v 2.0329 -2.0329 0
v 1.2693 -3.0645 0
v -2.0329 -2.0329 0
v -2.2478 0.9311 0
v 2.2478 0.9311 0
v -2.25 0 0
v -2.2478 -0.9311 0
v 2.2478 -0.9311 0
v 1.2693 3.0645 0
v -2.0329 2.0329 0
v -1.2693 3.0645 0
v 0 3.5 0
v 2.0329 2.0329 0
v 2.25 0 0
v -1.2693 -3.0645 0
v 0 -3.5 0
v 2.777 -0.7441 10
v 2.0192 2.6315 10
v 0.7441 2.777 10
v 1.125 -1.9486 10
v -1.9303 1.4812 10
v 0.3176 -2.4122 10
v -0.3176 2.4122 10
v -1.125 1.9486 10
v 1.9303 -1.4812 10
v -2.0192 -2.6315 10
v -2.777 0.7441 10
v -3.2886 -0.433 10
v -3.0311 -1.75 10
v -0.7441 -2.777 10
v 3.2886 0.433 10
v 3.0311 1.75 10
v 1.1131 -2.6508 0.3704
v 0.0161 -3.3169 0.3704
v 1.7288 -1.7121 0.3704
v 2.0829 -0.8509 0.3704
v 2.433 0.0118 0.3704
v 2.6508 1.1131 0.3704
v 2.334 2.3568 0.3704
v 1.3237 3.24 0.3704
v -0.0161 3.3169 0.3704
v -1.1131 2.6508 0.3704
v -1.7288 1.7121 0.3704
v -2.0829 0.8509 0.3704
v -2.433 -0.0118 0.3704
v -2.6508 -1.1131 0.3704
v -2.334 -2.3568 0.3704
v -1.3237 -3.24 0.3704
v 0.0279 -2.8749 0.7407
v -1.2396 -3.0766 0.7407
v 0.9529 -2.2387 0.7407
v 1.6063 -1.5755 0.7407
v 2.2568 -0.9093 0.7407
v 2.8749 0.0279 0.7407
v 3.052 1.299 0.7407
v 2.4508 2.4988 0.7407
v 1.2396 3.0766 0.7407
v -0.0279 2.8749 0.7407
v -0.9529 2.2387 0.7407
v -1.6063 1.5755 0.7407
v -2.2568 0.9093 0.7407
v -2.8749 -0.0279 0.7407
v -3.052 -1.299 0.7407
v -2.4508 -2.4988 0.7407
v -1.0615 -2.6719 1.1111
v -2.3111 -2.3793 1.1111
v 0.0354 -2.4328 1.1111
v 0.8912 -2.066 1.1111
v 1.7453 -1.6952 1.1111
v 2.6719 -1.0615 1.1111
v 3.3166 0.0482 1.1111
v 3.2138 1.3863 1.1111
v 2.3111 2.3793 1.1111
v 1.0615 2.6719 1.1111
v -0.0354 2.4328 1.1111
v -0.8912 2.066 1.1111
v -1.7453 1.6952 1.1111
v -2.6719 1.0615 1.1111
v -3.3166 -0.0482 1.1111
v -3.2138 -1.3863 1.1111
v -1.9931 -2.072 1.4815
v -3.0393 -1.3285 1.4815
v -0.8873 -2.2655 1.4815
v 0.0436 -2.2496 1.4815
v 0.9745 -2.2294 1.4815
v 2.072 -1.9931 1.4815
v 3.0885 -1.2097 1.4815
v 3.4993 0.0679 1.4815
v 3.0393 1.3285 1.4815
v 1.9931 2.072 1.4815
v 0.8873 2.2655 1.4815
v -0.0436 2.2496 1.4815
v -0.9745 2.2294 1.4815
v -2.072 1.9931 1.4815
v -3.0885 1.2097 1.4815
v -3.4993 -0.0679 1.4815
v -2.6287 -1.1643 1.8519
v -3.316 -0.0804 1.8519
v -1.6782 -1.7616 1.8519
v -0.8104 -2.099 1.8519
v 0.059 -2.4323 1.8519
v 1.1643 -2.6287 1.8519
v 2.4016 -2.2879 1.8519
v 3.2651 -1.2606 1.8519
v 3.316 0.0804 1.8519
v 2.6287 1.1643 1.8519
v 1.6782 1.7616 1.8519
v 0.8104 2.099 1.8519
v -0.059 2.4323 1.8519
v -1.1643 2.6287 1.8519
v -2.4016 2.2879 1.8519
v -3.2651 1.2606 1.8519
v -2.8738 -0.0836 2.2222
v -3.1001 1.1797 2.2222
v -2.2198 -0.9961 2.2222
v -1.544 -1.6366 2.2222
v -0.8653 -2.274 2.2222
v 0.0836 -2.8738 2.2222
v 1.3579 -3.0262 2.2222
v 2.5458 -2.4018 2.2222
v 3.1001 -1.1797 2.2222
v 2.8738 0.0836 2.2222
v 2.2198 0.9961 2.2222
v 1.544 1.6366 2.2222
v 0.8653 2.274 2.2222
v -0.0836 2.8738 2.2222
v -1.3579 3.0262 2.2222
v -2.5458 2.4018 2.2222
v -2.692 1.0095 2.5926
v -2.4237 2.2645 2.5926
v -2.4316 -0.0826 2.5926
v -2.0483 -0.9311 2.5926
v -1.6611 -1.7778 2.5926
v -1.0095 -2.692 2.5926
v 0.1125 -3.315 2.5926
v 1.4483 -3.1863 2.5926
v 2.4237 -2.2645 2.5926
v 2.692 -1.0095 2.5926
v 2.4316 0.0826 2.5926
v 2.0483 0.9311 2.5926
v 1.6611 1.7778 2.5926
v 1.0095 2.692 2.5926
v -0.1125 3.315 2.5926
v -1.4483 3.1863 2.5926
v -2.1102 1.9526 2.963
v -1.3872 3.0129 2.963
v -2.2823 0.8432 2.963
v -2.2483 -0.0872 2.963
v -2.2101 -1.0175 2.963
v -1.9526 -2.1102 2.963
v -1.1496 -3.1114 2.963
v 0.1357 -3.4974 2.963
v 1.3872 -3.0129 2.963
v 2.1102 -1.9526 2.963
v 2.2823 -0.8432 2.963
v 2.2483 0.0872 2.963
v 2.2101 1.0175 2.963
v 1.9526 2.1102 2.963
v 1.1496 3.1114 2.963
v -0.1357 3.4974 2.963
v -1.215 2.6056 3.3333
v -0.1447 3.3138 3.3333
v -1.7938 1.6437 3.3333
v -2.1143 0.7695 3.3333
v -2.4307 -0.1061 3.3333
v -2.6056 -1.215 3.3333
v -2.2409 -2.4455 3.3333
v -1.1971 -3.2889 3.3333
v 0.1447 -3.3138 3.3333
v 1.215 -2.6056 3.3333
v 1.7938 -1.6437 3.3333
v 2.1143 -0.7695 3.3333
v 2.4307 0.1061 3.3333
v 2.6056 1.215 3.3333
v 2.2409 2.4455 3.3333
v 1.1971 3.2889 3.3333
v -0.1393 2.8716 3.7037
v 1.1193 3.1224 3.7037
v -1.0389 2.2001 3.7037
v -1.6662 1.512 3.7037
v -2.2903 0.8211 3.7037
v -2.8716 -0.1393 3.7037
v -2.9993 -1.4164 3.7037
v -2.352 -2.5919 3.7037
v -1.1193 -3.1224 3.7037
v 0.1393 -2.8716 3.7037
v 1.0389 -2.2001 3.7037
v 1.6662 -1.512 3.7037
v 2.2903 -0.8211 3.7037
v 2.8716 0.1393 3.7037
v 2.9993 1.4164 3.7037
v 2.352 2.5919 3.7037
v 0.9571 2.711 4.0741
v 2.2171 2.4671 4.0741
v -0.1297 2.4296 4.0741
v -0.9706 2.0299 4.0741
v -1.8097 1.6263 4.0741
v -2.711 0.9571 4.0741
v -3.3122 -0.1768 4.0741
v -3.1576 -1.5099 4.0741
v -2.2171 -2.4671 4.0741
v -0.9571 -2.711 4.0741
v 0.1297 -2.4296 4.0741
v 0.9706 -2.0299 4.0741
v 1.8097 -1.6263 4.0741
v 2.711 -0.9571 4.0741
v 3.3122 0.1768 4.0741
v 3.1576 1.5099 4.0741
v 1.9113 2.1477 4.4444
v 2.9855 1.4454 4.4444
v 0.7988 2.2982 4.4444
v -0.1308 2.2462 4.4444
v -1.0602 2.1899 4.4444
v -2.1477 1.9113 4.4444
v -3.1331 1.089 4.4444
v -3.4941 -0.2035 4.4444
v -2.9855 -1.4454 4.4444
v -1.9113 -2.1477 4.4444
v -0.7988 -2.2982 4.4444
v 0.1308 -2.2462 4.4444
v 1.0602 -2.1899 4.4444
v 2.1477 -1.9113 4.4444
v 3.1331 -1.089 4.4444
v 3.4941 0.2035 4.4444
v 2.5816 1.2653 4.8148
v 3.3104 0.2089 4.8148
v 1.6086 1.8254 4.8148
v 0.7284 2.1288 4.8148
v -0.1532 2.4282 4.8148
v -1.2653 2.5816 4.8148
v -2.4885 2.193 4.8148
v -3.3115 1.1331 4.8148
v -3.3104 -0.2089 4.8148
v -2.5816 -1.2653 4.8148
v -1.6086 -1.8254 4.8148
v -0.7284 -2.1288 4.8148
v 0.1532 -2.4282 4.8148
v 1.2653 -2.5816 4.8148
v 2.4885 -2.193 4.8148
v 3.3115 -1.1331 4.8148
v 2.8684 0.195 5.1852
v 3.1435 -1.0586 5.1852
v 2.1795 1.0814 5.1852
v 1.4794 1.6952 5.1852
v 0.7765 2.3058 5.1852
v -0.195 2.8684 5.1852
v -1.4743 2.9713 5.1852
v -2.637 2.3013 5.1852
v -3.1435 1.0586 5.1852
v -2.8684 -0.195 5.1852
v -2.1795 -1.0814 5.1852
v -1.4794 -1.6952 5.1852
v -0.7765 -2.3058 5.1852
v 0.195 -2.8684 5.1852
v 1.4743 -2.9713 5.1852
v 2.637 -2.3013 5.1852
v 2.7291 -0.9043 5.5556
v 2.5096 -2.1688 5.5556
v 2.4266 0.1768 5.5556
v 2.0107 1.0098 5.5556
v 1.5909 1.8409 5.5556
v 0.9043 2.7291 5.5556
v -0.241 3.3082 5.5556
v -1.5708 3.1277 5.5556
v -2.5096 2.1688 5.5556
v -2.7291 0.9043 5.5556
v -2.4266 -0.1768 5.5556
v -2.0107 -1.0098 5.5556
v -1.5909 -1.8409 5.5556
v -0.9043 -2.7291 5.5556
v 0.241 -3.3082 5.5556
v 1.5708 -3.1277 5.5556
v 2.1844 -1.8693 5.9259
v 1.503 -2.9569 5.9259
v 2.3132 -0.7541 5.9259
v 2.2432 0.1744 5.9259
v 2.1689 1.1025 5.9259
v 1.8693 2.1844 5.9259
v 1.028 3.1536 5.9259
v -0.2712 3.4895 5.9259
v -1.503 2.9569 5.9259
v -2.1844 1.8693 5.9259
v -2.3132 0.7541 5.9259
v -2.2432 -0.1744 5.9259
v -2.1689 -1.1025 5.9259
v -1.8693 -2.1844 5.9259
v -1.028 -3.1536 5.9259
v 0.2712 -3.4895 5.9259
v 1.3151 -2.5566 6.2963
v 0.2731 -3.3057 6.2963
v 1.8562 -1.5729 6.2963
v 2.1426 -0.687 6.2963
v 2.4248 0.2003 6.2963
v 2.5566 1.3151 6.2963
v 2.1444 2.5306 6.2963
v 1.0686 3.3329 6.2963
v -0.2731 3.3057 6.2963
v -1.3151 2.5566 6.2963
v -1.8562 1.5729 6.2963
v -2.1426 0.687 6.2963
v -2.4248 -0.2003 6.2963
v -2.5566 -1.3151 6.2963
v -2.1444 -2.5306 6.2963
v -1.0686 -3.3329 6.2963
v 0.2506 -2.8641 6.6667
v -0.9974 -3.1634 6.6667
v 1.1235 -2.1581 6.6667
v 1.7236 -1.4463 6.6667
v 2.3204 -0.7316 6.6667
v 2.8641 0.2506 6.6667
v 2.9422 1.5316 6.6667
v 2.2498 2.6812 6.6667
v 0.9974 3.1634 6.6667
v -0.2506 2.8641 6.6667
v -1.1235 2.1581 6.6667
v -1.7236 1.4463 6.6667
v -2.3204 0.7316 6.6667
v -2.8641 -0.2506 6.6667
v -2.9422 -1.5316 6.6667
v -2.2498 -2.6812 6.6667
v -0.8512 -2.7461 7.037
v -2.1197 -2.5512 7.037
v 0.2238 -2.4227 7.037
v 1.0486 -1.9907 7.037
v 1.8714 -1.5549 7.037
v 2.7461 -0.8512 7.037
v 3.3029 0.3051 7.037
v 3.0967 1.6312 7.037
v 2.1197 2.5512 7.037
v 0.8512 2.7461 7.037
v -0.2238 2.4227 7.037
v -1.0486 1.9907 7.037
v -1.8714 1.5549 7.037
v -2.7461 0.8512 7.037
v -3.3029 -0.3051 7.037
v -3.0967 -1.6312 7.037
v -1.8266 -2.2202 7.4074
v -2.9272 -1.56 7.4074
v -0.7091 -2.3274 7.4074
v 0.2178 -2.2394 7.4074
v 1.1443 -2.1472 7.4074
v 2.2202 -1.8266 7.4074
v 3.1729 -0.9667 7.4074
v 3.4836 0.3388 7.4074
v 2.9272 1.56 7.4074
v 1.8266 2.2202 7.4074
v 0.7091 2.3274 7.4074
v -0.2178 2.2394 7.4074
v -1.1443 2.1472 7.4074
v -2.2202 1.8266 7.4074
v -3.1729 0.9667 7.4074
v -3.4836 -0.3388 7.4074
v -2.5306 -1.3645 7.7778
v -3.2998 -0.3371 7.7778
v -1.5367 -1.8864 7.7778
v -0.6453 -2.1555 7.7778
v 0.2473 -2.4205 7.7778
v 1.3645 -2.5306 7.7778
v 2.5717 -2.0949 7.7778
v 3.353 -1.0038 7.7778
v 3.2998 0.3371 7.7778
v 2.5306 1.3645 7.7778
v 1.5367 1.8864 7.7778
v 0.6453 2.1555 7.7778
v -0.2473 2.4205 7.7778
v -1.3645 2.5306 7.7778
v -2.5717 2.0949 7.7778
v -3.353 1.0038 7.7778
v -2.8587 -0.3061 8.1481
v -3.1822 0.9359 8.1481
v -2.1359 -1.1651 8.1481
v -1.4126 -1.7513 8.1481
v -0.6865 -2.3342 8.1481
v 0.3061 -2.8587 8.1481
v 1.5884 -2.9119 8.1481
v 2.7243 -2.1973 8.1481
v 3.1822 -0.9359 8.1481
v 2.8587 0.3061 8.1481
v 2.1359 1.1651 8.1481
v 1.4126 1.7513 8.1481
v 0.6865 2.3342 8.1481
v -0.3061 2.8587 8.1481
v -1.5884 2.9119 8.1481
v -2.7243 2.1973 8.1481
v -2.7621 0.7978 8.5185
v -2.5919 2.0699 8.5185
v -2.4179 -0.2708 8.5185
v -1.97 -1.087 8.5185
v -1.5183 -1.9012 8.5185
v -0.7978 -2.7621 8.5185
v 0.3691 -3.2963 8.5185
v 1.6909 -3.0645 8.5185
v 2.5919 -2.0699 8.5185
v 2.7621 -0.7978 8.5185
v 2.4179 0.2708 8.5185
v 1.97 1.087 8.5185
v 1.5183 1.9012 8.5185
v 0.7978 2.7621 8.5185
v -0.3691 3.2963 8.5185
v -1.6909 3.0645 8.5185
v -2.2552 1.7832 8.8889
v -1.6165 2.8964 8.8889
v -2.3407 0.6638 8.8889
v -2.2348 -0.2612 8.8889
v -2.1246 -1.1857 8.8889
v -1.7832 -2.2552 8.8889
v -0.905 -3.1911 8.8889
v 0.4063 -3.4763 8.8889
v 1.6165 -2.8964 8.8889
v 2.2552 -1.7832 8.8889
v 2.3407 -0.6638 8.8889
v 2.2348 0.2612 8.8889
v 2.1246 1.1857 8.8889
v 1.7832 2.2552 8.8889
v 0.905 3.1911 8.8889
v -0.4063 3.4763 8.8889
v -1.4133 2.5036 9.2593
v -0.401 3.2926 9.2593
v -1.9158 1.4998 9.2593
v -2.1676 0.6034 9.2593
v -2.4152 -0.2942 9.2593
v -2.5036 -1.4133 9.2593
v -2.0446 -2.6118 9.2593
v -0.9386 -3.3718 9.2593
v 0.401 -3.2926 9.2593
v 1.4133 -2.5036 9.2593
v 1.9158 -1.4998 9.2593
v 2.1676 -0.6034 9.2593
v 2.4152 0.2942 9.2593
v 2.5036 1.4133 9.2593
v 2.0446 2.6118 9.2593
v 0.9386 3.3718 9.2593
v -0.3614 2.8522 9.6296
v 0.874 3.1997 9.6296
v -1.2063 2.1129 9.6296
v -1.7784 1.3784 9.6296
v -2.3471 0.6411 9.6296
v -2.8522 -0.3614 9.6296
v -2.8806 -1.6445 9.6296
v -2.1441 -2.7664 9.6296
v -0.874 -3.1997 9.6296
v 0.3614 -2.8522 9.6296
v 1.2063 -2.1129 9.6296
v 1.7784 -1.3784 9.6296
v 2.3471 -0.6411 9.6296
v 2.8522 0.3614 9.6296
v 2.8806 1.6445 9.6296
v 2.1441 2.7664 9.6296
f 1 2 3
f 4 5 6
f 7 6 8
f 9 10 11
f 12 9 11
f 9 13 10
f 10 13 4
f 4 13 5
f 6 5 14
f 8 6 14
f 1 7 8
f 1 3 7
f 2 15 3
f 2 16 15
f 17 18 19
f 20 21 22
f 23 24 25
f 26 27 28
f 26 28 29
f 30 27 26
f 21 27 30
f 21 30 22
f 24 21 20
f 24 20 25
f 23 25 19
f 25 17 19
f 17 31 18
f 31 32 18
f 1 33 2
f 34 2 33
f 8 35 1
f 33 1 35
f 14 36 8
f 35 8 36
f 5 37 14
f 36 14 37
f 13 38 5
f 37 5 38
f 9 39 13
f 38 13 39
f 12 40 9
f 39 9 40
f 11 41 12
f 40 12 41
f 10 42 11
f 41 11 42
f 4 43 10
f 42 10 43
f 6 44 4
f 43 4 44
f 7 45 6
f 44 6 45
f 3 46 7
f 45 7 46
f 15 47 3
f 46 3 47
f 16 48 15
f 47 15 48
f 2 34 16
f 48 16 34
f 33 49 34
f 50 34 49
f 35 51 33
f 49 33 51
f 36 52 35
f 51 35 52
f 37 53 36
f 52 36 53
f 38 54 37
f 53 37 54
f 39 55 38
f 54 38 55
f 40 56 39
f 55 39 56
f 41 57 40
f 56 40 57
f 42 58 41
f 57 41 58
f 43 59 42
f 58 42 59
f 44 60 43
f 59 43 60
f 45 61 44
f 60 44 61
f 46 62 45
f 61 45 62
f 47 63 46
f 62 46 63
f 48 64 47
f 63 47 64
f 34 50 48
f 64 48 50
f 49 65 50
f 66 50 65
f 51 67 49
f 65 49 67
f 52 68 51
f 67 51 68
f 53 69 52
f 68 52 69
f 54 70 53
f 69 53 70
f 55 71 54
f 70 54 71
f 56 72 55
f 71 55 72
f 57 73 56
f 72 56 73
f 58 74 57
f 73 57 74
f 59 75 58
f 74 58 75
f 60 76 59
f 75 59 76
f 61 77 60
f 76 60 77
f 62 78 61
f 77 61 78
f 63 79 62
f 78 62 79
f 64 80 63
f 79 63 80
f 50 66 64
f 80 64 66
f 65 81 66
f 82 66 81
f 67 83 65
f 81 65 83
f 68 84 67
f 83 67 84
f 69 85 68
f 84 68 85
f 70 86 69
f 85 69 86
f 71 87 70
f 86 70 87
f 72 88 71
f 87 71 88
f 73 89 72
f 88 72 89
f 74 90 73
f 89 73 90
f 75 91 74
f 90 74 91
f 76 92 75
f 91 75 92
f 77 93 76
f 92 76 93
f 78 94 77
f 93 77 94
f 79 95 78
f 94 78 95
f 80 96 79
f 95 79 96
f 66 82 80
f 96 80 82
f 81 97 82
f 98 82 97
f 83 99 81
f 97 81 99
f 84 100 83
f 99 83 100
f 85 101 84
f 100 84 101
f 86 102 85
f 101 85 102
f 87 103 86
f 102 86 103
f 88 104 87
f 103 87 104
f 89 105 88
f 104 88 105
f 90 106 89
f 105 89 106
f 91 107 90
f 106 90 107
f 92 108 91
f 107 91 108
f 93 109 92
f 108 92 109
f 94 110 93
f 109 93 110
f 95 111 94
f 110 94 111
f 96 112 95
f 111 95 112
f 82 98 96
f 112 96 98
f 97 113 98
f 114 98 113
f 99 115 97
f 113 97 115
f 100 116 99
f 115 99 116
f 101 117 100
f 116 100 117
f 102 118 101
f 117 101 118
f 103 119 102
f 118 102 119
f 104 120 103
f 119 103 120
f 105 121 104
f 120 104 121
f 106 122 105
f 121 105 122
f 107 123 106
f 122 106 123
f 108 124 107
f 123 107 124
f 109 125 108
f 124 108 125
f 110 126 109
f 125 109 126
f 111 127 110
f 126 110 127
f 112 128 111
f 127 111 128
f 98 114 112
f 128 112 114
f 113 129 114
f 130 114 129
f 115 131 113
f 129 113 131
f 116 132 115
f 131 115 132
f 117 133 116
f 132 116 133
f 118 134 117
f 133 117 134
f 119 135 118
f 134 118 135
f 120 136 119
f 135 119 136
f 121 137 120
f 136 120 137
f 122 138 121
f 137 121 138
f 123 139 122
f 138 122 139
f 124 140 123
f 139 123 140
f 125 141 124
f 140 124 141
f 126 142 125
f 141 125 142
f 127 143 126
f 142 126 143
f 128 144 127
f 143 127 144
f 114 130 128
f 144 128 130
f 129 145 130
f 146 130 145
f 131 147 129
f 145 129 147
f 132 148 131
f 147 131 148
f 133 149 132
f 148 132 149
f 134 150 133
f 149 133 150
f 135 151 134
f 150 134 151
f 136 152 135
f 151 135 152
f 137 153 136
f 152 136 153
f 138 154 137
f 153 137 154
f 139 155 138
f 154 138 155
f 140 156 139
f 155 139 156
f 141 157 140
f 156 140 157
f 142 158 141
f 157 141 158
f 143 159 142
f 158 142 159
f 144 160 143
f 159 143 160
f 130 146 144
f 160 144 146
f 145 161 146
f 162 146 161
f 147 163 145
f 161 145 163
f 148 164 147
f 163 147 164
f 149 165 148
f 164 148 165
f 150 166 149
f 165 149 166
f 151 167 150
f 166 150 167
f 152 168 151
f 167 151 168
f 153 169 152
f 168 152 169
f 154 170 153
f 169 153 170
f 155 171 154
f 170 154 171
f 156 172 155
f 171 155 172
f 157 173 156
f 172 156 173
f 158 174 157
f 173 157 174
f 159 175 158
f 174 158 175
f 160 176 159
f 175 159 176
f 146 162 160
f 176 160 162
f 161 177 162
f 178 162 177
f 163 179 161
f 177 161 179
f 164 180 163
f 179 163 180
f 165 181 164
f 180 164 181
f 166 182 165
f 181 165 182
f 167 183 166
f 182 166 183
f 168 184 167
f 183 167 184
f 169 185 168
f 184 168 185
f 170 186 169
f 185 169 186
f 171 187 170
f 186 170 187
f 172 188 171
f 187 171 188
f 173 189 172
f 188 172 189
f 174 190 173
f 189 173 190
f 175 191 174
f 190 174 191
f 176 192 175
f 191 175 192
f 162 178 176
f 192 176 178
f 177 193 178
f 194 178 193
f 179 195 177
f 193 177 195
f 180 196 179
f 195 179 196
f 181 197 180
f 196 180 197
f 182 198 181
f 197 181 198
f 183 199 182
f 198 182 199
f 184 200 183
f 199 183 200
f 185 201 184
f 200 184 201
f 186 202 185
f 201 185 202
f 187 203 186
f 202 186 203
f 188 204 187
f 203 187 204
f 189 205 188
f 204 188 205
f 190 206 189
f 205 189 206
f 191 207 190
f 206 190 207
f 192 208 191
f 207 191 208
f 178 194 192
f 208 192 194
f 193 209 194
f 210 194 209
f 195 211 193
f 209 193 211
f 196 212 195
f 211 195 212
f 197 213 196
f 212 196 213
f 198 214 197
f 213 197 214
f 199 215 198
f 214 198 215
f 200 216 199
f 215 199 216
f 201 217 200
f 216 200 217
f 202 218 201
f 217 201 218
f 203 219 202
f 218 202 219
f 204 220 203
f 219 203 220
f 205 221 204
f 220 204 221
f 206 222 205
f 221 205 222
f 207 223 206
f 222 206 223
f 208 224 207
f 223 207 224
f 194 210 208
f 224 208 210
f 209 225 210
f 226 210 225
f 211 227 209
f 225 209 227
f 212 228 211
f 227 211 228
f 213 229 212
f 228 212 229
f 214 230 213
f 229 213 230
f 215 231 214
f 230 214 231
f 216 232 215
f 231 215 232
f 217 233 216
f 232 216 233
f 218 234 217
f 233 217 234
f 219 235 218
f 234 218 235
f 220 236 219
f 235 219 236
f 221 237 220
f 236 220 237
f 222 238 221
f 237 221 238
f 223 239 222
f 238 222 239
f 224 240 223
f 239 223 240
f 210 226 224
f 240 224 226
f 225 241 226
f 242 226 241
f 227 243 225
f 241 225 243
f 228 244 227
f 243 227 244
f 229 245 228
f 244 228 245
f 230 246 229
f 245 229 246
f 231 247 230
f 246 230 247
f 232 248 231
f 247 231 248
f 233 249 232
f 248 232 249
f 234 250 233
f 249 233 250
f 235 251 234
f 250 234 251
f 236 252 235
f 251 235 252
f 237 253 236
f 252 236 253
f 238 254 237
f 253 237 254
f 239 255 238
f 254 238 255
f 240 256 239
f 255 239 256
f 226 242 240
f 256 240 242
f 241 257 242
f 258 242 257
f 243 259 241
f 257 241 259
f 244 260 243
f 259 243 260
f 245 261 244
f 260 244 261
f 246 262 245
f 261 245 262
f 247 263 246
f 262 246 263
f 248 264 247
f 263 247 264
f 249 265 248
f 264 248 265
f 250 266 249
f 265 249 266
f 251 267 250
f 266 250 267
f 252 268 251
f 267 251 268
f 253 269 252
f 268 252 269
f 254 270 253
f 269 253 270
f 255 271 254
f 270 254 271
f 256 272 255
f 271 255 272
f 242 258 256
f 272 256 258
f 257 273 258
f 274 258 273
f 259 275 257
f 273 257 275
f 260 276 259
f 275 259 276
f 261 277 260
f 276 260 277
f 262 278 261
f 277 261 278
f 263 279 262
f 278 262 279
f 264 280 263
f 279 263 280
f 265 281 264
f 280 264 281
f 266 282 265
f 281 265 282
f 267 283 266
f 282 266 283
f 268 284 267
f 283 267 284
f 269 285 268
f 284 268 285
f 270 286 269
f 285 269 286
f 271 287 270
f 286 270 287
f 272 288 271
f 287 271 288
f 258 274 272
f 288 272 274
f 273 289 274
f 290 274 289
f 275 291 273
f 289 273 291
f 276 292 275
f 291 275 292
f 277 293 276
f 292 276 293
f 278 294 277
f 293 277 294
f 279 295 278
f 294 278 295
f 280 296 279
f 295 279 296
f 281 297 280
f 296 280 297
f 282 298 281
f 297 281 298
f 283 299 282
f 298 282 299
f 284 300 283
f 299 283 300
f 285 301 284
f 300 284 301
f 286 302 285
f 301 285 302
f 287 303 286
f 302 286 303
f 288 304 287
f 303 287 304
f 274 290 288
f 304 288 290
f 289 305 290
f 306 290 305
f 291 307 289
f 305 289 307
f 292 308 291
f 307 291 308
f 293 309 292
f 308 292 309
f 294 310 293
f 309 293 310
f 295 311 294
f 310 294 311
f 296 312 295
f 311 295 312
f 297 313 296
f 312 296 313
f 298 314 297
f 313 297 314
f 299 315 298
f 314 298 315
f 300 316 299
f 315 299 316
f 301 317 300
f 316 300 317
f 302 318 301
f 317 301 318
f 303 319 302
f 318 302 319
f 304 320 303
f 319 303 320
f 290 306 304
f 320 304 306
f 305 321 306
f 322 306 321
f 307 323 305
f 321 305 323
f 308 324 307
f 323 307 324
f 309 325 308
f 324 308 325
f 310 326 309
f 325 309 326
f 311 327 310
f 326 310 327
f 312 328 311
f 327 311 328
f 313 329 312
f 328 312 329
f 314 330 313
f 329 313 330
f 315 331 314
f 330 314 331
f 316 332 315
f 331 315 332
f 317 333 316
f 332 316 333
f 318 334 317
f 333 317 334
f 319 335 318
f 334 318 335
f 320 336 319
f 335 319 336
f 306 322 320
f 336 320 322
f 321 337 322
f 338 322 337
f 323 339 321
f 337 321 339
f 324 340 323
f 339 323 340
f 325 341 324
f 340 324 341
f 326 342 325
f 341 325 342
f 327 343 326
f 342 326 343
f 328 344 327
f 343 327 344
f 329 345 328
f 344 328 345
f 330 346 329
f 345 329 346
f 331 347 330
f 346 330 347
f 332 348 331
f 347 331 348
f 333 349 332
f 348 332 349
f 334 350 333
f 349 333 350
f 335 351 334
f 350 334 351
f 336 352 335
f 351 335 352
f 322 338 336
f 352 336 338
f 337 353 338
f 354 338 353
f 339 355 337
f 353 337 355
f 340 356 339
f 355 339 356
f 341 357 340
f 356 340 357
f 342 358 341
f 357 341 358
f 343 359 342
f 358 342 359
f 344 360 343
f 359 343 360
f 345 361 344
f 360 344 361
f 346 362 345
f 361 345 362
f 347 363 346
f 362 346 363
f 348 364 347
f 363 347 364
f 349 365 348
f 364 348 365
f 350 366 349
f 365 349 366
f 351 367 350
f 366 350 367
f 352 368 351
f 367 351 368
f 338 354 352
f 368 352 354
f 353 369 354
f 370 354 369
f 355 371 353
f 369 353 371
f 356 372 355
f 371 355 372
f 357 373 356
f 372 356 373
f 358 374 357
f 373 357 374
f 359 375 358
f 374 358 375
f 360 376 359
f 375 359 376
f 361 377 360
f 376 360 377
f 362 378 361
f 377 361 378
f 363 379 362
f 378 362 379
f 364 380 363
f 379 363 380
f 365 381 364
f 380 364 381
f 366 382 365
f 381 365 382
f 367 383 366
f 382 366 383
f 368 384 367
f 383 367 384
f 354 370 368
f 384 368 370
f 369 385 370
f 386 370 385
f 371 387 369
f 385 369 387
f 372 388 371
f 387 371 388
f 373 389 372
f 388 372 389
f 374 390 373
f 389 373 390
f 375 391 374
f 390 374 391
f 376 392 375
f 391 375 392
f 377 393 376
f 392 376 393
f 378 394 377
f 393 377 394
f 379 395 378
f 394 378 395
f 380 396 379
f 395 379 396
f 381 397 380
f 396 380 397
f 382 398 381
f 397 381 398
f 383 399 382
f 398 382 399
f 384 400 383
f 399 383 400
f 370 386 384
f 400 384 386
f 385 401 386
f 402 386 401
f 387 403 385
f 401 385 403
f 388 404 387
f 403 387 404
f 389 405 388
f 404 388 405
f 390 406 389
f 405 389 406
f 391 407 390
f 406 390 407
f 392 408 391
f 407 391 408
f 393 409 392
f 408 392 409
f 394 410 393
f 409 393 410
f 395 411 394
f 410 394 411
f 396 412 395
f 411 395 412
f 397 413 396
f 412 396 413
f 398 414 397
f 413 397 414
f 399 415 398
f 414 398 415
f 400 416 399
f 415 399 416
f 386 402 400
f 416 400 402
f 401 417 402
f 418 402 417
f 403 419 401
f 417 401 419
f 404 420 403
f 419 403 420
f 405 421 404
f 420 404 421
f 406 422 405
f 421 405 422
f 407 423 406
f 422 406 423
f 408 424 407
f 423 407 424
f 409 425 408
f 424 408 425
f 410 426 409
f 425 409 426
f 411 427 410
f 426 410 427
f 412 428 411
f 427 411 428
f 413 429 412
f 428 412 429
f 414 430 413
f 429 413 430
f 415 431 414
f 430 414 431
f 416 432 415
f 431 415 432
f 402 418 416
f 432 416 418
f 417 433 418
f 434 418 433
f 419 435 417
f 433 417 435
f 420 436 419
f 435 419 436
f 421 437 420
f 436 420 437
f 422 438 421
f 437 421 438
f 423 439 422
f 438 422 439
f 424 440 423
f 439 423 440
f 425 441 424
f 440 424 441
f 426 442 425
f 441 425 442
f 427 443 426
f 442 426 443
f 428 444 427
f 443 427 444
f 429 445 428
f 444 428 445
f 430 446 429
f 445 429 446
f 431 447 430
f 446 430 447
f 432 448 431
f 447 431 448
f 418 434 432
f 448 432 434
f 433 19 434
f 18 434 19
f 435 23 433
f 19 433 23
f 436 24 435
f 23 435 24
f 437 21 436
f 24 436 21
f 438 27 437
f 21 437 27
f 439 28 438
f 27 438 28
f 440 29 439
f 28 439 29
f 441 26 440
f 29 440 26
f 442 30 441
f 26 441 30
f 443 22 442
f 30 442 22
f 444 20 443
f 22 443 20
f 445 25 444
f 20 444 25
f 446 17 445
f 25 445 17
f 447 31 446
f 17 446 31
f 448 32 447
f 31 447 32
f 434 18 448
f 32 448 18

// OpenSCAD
// [FL_INDEX: keywords="openscad, 3d_parametric, OpenSCAD__static_arrays_-__static_resolution, csg_solid" | COT="Parametric OpenSCAD design from 3DCodeverse"]
// Title: OpenSCAD: static arrays -> static resolution

/*
author: Lukas Süss aka mechadense
date: 2014  
licence: public domain 

Description:
This demo code illustrates
how the lack of any dynammic array manipulation in OpenSCAD 
effectively inhibits parametric resolution
in geometries using the polygon(...) command.
*/

// test part geometry
r0 = 3.5;
dr = 1.25; // profile depth
l  = 10;
k  = 3; // thread lead
n  = 2; // multi start
turns = l/(k*n);

roughscrew();

module roughscrew()
{
  linear_extrude(height=l,center=false,convexity=6,twist=360*turns,$fn=16)
  polygon(points=pointarray16(r0,dr,n), paths=[path16]);
}

function rr(r0,dr,n,phi) = r0 + dr*(profile1(phi*n)-1);
function profile1(x) = (1 - cos(x))/2;
function c(i) = (i/16.0)*360; // index to angle conversion

// section with necessarily hardcoded 16 vertex resolution
path16 = [0,1,2,3,4,5,6,7,8,9,10,11,12,13,14,15];
function pointarray16(r0,dr,n) = [[rr(r0,dr,n,c(0))*cos(c(0)),rr(r0,dr,n,c(0))*sin(c(0))],[rr(r0,dr,n,c(1))*cos(c(1)),rr(r0,dr,n,c(1))*sin(c(1))],[rr(r0,dr,n,c(2))*cos(c(2)),rr(r0,dr,n,c(2))*sin(c(2))],[rr(r0,dr,n,c(3))*cos(c(3)),rr(r0,dr,n,c(3))*sin(c(3))],[rr(r0,dr,n,c(4))*cos(c(4)),rr(r0,dr,n,c(4))*sin(c(4))],[rr(r0,dr,n,c(5))*cos(c(5)),rr(r0,dr,n,c(5))*sin(c(5))],[rr(r0,dr,n,c(6))*cos(c(6)),rr(r0,dr,n,c(6))*sin(c(6))],[rr(r0,dr,n,c(7))*cos(c(7)),rr(r0,dr,n,c(7))*sin(c(7))],[rr(r0,dr,n,c(8))*cos(c(8)),rr(r0,dr,n,c(8))*sin(c(8))],[rr(r0,dr,n,c(9))*cos(c(9)),rr(r0,dr,n,c(9))*sin(c(9))],[rr(r0,dr,n,c(10))*cos(c(10)),rr(r0,dr,n,c(10))*sin(c(10))],[rr(r0,dr,n,c(11))*cos(c(11)),rr(r0,dr,n,c(11))*sin(c(11))],[rr(r0,dr,n,c(12))*cos(c(12)),rr(r0,dr,n,c(12))*sin(c(12))],[rr(r0,dr,n,c(13))*cos(c(13)),rr(r0,dr,n,c(13))*sin(c(13))],[rr(r0,dr,n,c(14))*cos(c(14)),rr(r0,dr,n,c(14))*sin(c(14))],[rr(r0,dr,n,c(15))*cos(c(15)),rr(r0,dr,n,c(15))*sin(c(15))]];
